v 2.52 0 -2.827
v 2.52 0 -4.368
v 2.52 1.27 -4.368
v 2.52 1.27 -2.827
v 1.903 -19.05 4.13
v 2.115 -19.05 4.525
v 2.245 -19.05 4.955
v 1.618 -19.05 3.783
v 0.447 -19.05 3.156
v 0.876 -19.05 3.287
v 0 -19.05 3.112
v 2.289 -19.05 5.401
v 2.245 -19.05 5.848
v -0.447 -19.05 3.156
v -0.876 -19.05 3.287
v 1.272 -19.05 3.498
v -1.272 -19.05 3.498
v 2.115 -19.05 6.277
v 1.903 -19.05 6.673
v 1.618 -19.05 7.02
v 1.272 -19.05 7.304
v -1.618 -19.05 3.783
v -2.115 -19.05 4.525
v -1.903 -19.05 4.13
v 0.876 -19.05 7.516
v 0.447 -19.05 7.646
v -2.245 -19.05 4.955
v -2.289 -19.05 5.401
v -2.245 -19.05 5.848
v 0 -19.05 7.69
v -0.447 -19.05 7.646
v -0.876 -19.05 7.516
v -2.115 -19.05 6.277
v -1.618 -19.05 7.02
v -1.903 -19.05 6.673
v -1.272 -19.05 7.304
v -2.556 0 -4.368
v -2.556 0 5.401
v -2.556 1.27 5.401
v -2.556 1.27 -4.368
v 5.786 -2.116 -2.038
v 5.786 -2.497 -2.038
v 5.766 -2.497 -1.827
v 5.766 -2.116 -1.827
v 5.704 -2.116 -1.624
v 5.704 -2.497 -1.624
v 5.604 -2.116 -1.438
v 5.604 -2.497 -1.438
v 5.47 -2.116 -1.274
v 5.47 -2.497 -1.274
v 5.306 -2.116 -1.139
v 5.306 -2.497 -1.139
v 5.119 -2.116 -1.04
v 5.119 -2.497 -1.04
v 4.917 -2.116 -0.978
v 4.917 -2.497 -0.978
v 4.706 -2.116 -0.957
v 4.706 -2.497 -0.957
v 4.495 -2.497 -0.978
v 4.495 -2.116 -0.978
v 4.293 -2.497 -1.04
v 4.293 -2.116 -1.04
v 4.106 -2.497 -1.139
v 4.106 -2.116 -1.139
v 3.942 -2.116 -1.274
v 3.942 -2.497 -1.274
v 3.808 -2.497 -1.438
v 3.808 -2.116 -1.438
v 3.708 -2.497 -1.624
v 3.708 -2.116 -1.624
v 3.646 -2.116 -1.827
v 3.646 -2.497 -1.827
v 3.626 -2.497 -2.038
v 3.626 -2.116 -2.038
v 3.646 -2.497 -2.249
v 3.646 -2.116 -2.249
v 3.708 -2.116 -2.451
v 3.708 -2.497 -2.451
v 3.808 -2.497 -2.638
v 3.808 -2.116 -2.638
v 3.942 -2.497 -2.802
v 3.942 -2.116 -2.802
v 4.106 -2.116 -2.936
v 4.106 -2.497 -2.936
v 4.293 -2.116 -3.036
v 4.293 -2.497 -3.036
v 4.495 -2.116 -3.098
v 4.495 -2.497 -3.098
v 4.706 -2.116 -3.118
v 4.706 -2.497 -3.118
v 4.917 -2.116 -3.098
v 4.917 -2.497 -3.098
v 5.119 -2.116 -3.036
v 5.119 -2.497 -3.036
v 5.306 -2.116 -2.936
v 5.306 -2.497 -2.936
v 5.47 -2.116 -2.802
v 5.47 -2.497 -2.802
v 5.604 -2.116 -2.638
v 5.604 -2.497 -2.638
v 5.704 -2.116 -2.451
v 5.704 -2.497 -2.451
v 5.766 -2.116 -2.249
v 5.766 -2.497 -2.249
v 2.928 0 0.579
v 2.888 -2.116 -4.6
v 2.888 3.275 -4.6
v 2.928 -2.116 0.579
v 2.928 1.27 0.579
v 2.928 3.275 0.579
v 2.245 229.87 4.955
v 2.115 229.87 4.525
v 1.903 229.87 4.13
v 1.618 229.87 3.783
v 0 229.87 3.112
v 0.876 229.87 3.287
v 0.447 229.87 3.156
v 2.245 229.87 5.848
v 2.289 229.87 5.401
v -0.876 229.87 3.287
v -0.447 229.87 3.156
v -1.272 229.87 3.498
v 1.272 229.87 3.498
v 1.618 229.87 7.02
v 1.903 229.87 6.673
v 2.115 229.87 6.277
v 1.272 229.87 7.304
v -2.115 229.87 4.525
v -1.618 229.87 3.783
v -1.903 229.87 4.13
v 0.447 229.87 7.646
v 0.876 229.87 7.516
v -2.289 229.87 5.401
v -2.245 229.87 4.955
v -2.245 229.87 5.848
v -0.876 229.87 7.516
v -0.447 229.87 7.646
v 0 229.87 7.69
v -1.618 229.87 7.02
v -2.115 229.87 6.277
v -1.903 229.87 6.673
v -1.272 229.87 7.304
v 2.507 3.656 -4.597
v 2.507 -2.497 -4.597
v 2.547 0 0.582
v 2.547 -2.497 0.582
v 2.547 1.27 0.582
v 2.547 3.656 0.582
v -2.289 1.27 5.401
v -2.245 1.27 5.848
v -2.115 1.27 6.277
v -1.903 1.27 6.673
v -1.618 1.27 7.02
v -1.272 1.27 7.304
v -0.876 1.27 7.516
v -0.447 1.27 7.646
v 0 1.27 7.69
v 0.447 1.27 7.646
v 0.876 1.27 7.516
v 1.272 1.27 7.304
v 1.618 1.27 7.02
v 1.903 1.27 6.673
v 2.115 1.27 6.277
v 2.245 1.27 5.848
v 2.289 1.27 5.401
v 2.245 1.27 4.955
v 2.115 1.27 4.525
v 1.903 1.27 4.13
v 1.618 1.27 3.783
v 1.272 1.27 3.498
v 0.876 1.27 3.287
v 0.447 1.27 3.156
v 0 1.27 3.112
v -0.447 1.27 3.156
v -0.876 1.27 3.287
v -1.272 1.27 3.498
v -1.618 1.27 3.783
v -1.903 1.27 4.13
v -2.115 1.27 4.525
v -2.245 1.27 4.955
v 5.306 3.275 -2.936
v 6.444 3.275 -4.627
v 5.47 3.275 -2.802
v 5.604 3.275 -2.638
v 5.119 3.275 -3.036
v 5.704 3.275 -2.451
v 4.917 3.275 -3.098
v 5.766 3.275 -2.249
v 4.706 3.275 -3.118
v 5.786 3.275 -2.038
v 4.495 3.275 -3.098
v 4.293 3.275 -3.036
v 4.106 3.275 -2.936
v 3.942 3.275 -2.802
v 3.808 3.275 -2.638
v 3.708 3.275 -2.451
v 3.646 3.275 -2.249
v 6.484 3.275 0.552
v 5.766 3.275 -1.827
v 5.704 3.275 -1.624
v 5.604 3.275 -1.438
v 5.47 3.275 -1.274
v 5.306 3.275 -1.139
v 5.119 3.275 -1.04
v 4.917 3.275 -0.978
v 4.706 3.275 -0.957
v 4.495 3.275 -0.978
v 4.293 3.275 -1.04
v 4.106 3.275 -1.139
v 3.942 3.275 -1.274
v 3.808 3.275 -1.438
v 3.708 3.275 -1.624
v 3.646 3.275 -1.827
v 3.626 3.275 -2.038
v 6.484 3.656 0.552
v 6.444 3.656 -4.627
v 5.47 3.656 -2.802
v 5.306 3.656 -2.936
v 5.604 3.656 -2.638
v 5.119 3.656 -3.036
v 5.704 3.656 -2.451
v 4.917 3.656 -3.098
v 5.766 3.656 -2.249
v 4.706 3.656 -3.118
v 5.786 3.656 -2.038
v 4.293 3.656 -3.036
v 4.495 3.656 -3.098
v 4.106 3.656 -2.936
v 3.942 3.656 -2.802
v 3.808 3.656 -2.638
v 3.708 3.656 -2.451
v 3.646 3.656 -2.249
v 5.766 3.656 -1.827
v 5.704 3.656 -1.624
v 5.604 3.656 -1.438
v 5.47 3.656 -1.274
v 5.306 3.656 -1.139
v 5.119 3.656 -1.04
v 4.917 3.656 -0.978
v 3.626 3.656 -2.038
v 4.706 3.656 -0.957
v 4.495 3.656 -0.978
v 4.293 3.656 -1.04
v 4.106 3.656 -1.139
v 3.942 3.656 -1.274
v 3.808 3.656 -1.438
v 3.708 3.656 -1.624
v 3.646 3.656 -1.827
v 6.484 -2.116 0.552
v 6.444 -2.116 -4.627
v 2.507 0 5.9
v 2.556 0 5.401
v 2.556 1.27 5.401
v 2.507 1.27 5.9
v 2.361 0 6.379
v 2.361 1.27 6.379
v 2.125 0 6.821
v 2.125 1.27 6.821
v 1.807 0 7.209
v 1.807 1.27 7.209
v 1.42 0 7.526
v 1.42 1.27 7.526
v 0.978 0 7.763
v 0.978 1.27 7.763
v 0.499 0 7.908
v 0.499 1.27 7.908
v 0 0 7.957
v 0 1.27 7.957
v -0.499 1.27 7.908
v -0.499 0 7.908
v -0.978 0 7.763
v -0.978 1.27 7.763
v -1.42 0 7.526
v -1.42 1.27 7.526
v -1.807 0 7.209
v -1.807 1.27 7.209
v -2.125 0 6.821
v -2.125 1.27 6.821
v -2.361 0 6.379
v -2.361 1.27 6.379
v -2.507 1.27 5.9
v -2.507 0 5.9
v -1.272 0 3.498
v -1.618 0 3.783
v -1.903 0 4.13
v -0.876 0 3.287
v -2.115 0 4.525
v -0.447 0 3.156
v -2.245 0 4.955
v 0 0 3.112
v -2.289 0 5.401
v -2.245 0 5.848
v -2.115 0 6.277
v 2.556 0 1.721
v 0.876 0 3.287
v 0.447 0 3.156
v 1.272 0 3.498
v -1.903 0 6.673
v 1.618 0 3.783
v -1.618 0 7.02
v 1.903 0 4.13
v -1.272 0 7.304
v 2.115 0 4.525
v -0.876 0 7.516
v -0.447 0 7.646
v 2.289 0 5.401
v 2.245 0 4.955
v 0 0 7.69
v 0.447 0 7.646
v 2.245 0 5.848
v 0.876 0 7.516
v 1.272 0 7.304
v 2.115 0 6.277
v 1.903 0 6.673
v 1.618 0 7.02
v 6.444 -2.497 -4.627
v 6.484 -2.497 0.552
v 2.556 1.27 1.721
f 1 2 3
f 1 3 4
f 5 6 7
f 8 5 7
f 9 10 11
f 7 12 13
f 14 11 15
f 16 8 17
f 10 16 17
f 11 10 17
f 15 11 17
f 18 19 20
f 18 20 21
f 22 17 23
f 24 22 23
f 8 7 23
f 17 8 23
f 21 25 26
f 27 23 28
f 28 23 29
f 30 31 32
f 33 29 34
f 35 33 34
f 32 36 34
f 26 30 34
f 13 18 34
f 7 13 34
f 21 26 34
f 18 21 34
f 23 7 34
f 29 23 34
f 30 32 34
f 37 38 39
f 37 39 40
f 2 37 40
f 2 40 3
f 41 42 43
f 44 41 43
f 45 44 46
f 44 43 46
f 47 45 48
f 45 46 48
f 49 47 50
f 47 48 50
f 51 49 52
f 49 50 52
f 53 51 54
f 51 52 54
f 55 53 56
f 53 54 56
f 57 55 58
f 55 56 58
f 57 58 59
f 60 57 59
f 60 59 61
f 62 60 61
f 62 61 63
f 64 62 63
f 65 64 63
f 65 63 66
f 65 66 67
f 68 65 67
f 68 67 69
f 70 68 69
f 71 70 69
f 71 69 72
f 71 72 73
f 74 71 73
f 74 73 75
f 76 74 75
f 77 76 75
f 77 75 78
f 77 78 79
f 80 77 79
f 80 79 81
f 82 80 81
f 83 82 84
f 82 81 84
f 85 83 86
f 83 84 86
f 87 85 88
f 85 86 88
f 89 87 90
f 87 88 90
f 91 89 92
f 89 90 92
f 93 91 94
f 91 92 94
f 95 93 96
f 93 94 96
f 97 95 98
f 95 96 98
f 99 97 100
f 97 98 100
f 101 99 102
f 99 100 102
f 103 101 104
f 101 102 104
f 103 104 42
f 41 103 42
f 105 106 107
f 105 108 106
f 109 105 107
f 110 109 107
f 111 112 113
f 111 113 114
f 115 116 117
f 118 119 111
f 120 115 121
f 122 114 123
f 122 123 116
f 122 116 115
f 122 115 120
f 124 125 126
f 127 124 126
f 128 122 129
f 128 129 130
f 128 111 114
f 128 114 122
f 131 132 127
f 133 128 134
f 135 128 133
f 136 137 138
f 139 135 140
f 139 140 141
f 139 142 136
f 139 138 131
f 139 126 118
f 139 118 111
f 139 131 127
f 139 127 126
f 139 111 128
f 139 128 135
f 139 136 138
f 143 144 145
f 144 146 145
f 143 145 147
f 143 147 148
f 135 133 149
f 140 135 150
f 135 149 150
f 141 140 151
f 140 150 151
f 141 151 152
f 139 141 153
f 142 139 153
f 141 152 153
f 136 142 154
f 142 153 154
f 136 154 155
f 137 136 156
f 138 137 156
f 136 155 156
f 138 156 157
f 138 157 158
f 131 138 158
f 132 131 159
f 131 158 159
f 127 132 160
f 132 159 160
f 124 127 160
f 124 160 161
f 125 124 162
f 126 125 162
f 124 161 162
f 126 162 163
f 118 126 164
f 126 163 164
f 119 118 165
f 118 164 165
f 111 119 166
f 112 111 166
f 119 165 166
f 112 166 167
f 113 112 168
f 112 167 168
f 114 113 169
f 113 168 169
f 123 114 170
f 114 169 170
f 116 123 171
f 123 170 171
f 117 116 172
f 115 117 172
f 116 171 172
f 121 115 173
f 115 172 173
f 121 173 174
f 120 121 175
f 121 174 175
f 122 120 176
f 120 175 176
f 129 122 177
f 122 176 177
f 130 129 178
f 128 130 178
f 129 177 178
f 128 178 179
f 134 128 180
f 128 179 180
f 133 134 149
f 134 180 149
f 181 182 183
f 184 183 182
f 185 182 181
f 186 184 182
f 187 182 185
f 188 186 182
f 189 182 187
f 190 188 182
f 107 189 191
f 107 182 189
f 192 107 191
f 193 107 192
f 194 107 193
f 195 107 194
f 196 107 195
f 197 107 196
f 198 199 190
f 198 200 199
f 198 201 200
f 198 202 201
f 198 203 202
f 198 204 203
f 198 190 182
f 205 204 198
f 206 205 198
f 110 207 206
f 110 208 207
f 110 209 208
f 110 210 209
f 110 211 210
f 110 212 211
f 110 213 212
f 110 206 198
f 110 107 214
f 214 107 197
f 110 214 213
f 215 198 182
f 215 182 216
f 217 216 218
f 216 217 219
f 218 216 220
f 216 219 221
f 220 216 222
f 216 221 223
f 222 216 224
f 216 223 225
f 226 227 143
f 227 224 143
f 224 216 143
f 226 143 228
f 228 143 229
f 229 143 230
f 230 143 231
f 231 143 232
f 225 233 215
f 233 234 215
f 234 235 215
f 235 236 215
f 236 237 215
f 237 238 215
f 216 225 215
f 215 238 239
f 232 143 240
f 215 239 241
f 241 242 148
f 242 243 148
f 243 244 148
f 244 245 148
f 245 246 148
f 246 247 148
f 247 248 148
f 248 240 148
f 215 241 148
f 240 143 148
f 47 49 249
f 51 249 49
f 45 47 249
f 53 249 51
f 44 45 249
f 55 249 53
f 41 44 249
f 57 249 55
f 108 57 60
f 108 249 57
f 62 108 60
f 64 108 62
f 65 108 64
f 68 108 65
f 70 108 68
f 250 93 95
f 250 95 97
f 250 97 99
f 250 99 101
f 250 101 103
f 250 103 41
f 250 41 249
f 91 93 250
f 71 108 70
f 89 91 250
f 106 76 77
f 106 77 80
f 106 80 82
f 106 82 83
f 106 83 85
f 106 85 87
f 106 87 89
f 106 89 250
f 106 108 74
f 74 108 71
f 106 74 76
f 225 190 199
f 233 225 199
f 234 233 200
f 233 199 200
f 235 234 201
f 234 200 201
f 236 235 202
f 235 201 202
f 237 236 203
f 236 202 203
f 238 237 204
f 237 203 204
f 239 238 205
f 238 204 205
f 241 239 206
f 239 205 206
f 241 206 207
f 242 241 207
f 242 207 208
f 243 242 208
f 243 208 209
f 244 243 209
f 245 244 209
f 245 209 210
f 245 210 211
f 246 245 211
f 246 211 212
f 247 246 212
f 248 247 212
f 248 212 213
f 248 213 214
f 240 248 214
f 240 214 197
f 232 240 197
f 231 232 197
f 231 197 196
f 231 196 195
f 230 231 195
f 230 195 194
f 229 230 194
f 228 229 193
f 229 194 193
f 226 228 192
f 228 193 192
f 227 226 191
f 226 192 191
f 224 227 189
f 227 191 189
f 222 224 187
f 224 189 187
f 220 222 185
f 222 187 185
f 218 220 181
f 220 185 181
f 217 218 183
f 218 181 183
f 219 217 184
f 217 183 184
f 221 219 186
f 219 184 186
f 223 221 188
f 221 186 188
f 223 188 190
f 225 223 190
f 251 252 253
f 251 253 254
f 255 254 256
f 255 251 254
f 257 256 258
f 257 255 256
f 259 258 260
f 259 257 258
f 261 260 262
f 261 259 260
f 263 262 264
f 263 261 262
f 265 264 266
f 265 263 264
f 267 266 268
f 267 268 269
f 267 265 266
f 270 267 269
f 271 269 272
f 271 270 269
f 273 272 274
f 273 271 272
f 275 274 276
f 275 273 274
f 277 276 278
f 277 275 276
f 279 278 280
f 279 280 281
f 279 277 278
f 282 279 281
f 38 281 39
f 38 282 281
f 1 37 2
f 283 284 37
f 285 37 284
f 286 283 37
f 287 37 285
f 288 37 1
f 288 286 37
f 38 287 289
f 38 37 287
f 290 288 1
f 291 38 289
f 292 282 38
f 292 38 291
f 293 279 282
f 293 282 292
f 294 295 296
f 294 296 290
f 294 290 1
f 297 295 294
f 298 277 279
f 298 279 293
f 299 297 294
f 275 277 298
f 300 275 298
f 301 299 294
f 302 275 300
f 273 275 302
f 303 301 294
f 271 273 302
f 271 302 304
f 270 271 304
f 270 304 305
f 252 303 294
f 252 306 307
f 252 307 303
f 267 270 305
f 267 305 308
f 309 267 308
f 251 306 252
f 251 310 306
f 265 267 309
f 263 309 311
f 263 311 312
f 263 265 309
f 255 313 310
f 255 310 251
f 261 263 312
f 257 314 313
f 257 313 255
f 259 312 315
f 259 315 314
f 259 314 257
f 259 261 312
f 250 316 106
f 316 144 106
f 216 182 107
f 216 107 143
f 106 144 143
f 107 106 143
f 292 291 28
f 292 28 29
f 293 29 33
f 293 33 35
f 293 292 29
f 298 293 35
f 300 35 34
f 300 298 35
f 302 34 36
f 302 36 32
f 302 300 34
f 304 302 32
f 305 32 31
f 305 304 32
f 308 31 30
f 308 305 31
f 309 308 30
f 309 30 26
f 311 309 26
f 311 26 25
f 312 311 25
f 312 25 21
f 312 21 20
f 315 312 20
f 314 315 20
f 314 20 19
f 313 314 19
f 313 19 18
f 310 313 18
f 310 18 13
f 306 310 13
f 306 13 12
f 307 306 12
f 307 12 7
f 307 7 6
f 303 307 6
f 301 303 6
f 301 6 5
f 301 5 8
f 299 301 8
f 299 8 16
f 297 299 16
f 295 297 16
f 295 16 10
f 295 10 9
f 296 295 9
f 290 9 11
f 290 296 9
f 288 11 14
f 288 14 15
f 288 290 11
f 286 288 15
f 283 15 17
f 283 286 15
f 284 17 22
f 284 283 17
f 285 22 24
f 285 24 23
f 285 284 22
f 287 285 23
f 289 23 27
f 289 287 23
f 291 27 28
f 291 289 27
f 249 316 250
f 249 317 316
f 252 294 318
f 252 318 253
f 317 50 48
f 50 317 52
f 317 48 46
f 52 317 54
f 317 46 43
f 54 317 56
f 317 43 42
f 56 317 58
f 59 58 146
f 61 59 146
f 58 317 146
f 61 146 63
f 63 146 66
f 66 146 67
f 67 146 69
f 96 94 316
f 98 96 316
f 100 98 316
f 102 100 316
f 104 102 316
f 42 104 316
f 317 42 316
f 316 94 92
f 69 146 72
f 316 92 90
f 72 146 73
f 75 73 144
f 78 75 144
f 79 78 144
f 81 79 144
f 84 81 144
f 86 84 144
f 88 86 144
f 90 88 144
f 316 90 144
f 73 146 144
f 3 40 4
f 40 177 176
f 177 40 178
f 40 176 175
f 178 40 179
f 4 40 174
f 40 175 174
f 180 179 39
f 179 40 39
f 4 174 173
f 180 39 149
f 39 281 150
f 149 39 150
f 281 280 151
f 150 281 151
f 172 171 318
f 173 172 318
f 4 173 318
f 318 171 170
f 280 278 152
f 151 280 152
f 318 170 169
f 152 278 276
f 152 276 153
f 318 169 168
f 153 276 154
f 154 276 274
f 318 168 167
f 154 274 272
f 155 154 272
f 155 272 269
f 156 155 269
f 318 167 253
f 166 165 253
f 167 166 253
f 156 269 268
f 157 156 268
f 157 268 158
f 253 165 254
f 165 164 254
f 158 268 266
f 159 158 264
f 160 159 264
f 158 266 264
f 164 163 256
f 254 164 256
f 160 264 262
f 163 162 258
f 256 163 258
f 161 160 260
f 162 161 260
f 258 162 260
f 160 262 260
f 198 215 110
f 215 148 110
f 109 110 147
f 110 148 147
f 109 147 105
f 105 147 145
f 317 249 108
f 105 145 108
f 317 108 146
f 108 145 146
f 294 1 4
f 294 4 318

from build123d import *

# Parameters (mm, degrees)
F1_DEPTH      = 1.27
F2_R          = 2.2887754184
F3_DEPTH      = 228.6
F3_DEPTH_BACK = 20.32
F4_W          = 1.27
F4_H          = 3.4091206923
F5_DEPTH      = 3.937
F6_T          = -0.381
F7_R          = 1.080450049
F8_DEPTH      = 11.176


# Not quite as in the source:
# - a feature names something its author has since deleted; it is built from what else it names


with BuildPart() as f1:
    # F0 (on Front) → F1 (new body)
    with BuildSketch(Plane.XZ):
        with BuildLine():
            ThreePointArc((-2.5559609307, 5.4012401961), (0, 2.8452792654), (2.5559609307, 5.4012401961))
            ThreePointArc((2.5559609307, 5.4012401961), (0, 7.9572011268), (-2.5559609307, 5.4012401961))
        make_face()
        with BuildLine():
            Line((2.5559609307, 1.721014436), (2.5559609307, 5.4012401961))
            ThreePointArc((2.5559609307, 5.4012401961), (0, 2.8452792654), (-2.5559609307, 5.4012401961))
            Line((-2.5559609307, 5.4012401961), (-2.5559609307, 4.3758706689))
            Line((-2.5559609307, 4.3758706689), (-2.5559609307, -2.8266729787))
            Line((-2.5559609307, -2.8266729787), (-2.5559609307, -4.3681138195))
            Line((-2.5559609307, -4.3681138195), (2.5204877513, -4.3681138195))
            Line((2.5204877513, -4.3681138195), (2.5204877513, -2.8266729787))
            Line((2.5204877513, -2.8266729787), (2.5559609307, 1.721014436))
        make_face()
    extrude(amount=-F1_DEPTH)

    # F2 (on face) → F3 (join, two sides)
    with BuildSketch(Plane(origin=(0, 1.27, 0), x_dir=(-1, 0, 0), z_dir=(0, 1, 0))) as f3_sk:
        with Locations((0, 5.4012401961)):
            Circle(F2_R)
    extrude(amount=F3_DEPTH)
    extrude(f3_sk.sketch, amount=-F3_DEPTH_BACK)


with BuildPart() as f5:
    # F4 (on face) → F5 (new body)
    with BuildSketch(Plane(origin=(2.5423818682, 0, -0.0198312593), x_dir=(0, 1, 0), z_dir=(0.9999695793, 0, -0.0078000304))):
        Polygon((-2.497356755, -4.576918826), (3.6564493494, -4.576918826), (3.6564493494, 0.6021935842), (1.27, 0.6021935842), (1.27, -2.8069271081), (0, -2.8069271081), (0, 0.6021935842), (-2.497356755, 0.6021935842), align=None)
        with Locations((0.635, -1.102366762)):
            Rectangle(F4_W, F4_H)
    extrude(amount=F5_DEPTH)

    # F6
    f6_openings = [f5.faces().sort_by_distance(p)[0] for p in [
        (6.463761, 0.579546, -2.037842),
        (4.515519, 0.579546, 0.56699),
        (4.475122, 0.579546, -4.611965),
    ]]
    offset(amount=F6_T, openings=f6_openings)

    # F7 (on face) → F8 (cut)
    with BuildSketch(Plane.XZ.offset(2.497356755)):
        with Locations((4.7060133182, -2.0378421431)):
            Circle(F7_R)
    extrude(amount=-F8_DEPTH, mode=Mode.SUBTRACT)


solid = Compound([f1.part, f5.part])
